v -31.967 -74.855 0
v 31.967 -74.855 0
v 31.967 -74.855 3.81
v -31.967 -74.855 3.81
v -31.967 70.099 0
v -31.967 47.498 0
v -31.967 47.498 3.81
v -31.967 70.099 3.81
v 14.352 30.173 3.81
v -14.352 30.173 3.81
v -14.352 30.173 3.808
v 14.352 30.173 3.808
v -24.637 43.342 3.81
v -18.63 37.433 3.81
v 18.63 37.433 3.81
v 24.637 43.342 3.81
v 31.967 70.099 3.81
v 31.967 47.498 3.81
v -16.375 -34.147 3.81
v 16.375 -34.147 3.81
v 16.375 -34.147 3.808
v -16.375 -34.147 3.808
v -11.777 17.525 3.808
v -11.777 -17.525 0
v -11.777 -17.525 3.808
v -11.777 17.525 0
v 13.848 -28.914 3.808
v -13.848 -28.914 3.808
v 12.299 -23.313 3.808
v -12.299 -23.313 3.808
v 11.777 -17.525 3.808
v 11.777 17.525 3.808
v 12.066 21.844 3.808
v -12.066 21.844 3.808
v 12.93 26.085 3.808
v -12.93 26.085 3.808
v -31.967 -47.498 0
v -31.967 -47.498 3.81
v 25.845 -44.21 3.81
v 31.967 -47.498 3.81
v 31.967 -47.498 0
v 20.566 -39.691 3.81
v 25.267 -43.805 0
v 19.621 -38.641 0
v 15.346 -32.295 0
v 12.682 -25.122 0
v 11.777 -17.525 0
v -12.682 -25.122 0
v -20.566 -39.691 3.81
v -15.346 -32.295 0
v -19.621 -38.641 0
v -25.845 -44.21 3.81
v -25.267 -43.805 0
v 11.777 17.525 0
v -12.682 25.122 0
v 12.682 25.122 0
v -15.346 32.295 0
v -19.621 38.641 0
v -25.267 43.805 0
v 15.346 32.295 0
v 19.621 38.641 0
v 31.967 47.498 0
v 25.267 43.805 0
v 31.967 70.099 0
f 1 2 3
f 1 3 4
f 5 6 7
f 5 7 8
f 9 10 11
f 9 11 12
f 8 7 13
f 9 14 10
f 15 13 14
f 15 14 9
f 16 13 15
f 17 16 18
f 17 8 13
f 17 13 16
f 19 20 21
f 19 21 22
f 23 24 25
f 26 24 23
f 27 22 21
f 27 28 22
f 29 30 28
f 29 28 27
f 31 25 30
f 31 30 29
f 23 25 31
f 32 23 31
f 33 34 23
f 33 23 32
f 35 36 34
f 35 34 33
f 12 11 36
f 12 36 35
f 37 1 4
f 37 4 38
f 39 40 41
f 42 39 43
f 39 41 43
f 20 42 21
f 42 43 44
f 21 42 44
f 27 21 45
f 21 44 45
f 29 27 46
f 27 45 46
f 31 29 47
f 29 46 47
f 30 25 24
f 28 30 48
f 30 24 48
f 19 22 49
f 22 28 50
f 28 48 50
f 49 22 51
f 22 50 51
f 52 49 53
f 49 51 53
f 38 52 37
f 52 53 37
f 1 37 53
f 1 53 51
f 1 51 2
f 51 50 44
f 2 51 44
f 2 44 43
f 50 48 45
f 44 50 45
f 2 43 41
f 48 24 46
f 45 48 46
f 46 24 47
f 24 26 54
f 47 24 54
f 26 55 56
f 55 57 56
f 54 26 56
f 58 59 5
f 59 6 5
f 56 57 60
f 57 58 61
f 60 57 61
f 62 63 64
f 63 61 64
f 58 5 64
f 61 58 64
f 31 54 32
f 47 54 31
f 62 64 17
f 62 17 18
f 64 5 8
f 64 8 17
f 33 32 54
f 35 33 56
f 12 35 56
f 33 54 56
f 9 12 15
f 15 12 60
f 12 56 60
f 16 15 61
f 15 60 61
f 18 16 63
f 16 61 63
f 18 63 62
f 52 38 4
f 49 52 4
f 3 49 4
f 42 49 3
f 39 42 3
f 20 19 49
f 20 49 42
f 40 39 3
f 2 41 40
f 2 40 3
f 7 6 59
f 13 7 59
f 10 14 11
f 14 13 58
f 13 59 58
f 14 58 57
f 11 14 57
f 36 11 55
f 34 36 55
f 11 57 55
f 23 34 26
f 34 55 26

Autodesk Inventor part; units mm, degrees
ref_plane "YZ Plane" through (0, 0, 0) normal (1, 0, 0) x (0, 1, 0)
ref_plane "XZ Plane" through (0, 0, 0) normal (0, 1, 0) x (-1, 0, 0)
ref_plane "XY Plane" through (0, 0, 0) normal (0, 0, 1) x (1, 0, 0)
sketch "Sketch1" plane through (0, 0, 0) normal (0, 0, 1) x (1, 0, 0)
  line L0 (-31.9674, 70.0993) -> (31.9674, 70.0993)
  line L1 (31.9674, 70.0993) -> (31.9674, -74.8548)
  line L2 (31.9674, -74.8548) -> (-31.9674, -74.8548)
  line L3 (-31.9674, -74.8548) -> (-31.9674, 70.0993)
  circle A0 centre (-44.1203, 17.5249) radius 32.3435
  circle A1 centre (44.1203, 17.5249) radius 32.3435
  line L4 (0, 0) -> (0, 29.7658) construction
  line L5 (-44.1203, 17.5249) -> (44.1203, 17.5249)
  line L6 (44.1203, 17.5249) -> (44.1203, -17.5249)
  line L7 (44.1203, -17.5249) -> (-44.1203, -17.5249)
  line L8 (-44.1203, -17.5249) -> (-44.1203, 17.5249)
  line L9 (0, 0) -> (9.4229, 0) construction
  circle A2 centre (44.1203, -17.5249) radius 32.3435
  circle A3 centre (-44.1203, -17.5249) radius 32.3435
  line L10 (-11.7768, 40.2762) -> (11.7768, 40.2762)
  line L11 (11.7768, 40.2762) -> (11.7768, -36.31)
  line L12 (11.7768, -36.31) -> (-11.7768, -36.31)
  line L13 (-11.7768, -36.31) -> (-11.7768, 40.2762)
  point P0 (-31.9674, 47.4983)
  point P1 (-11.7768, 17.5249)
  point P2 (-11.7768, -17.5249)
  point P3 (-31.9674, -47.4983)
  point P4 (31.9674, -47.4983)
  point P5 (11.7768, -17.5249)
  point P6 (11.7768, 17.5249)
  point P7 (31.9674, 47.4983)
extrude "Extrusion1" add sketch "Sketch1" along normal blind 3.81 contours L0 L1 A1 L11 L10 L13 A0 L3 | L13 L10 L11 L5 | L5 L11 L7 L13 | L13 L12 L11 A2 L1 L2 L3 A3 | L7 L11 L12 L13
sketch "Sketch2" plane through (0, 0, 3.81) normal (0, 0, 1) x (1, 0, 0)
  line L0 (-20.9663, 30.173) -> (25.2183, 30.173)
  line L1 (25.2183, 30.173) -> (25.2183, -34.1474)
  line L2 (25.2183, -34.1474) -> (-20.9663, -34.1474)
  line L3 (-20.9663, -34.1474) -> (-20.9663, 30.173)
  point P0 (0, 0)
extrude "Extrusion2" cut sketch "Sketch2" against normal blind 0.0025
properties part number "dogbone" material "Speckle pattern"
